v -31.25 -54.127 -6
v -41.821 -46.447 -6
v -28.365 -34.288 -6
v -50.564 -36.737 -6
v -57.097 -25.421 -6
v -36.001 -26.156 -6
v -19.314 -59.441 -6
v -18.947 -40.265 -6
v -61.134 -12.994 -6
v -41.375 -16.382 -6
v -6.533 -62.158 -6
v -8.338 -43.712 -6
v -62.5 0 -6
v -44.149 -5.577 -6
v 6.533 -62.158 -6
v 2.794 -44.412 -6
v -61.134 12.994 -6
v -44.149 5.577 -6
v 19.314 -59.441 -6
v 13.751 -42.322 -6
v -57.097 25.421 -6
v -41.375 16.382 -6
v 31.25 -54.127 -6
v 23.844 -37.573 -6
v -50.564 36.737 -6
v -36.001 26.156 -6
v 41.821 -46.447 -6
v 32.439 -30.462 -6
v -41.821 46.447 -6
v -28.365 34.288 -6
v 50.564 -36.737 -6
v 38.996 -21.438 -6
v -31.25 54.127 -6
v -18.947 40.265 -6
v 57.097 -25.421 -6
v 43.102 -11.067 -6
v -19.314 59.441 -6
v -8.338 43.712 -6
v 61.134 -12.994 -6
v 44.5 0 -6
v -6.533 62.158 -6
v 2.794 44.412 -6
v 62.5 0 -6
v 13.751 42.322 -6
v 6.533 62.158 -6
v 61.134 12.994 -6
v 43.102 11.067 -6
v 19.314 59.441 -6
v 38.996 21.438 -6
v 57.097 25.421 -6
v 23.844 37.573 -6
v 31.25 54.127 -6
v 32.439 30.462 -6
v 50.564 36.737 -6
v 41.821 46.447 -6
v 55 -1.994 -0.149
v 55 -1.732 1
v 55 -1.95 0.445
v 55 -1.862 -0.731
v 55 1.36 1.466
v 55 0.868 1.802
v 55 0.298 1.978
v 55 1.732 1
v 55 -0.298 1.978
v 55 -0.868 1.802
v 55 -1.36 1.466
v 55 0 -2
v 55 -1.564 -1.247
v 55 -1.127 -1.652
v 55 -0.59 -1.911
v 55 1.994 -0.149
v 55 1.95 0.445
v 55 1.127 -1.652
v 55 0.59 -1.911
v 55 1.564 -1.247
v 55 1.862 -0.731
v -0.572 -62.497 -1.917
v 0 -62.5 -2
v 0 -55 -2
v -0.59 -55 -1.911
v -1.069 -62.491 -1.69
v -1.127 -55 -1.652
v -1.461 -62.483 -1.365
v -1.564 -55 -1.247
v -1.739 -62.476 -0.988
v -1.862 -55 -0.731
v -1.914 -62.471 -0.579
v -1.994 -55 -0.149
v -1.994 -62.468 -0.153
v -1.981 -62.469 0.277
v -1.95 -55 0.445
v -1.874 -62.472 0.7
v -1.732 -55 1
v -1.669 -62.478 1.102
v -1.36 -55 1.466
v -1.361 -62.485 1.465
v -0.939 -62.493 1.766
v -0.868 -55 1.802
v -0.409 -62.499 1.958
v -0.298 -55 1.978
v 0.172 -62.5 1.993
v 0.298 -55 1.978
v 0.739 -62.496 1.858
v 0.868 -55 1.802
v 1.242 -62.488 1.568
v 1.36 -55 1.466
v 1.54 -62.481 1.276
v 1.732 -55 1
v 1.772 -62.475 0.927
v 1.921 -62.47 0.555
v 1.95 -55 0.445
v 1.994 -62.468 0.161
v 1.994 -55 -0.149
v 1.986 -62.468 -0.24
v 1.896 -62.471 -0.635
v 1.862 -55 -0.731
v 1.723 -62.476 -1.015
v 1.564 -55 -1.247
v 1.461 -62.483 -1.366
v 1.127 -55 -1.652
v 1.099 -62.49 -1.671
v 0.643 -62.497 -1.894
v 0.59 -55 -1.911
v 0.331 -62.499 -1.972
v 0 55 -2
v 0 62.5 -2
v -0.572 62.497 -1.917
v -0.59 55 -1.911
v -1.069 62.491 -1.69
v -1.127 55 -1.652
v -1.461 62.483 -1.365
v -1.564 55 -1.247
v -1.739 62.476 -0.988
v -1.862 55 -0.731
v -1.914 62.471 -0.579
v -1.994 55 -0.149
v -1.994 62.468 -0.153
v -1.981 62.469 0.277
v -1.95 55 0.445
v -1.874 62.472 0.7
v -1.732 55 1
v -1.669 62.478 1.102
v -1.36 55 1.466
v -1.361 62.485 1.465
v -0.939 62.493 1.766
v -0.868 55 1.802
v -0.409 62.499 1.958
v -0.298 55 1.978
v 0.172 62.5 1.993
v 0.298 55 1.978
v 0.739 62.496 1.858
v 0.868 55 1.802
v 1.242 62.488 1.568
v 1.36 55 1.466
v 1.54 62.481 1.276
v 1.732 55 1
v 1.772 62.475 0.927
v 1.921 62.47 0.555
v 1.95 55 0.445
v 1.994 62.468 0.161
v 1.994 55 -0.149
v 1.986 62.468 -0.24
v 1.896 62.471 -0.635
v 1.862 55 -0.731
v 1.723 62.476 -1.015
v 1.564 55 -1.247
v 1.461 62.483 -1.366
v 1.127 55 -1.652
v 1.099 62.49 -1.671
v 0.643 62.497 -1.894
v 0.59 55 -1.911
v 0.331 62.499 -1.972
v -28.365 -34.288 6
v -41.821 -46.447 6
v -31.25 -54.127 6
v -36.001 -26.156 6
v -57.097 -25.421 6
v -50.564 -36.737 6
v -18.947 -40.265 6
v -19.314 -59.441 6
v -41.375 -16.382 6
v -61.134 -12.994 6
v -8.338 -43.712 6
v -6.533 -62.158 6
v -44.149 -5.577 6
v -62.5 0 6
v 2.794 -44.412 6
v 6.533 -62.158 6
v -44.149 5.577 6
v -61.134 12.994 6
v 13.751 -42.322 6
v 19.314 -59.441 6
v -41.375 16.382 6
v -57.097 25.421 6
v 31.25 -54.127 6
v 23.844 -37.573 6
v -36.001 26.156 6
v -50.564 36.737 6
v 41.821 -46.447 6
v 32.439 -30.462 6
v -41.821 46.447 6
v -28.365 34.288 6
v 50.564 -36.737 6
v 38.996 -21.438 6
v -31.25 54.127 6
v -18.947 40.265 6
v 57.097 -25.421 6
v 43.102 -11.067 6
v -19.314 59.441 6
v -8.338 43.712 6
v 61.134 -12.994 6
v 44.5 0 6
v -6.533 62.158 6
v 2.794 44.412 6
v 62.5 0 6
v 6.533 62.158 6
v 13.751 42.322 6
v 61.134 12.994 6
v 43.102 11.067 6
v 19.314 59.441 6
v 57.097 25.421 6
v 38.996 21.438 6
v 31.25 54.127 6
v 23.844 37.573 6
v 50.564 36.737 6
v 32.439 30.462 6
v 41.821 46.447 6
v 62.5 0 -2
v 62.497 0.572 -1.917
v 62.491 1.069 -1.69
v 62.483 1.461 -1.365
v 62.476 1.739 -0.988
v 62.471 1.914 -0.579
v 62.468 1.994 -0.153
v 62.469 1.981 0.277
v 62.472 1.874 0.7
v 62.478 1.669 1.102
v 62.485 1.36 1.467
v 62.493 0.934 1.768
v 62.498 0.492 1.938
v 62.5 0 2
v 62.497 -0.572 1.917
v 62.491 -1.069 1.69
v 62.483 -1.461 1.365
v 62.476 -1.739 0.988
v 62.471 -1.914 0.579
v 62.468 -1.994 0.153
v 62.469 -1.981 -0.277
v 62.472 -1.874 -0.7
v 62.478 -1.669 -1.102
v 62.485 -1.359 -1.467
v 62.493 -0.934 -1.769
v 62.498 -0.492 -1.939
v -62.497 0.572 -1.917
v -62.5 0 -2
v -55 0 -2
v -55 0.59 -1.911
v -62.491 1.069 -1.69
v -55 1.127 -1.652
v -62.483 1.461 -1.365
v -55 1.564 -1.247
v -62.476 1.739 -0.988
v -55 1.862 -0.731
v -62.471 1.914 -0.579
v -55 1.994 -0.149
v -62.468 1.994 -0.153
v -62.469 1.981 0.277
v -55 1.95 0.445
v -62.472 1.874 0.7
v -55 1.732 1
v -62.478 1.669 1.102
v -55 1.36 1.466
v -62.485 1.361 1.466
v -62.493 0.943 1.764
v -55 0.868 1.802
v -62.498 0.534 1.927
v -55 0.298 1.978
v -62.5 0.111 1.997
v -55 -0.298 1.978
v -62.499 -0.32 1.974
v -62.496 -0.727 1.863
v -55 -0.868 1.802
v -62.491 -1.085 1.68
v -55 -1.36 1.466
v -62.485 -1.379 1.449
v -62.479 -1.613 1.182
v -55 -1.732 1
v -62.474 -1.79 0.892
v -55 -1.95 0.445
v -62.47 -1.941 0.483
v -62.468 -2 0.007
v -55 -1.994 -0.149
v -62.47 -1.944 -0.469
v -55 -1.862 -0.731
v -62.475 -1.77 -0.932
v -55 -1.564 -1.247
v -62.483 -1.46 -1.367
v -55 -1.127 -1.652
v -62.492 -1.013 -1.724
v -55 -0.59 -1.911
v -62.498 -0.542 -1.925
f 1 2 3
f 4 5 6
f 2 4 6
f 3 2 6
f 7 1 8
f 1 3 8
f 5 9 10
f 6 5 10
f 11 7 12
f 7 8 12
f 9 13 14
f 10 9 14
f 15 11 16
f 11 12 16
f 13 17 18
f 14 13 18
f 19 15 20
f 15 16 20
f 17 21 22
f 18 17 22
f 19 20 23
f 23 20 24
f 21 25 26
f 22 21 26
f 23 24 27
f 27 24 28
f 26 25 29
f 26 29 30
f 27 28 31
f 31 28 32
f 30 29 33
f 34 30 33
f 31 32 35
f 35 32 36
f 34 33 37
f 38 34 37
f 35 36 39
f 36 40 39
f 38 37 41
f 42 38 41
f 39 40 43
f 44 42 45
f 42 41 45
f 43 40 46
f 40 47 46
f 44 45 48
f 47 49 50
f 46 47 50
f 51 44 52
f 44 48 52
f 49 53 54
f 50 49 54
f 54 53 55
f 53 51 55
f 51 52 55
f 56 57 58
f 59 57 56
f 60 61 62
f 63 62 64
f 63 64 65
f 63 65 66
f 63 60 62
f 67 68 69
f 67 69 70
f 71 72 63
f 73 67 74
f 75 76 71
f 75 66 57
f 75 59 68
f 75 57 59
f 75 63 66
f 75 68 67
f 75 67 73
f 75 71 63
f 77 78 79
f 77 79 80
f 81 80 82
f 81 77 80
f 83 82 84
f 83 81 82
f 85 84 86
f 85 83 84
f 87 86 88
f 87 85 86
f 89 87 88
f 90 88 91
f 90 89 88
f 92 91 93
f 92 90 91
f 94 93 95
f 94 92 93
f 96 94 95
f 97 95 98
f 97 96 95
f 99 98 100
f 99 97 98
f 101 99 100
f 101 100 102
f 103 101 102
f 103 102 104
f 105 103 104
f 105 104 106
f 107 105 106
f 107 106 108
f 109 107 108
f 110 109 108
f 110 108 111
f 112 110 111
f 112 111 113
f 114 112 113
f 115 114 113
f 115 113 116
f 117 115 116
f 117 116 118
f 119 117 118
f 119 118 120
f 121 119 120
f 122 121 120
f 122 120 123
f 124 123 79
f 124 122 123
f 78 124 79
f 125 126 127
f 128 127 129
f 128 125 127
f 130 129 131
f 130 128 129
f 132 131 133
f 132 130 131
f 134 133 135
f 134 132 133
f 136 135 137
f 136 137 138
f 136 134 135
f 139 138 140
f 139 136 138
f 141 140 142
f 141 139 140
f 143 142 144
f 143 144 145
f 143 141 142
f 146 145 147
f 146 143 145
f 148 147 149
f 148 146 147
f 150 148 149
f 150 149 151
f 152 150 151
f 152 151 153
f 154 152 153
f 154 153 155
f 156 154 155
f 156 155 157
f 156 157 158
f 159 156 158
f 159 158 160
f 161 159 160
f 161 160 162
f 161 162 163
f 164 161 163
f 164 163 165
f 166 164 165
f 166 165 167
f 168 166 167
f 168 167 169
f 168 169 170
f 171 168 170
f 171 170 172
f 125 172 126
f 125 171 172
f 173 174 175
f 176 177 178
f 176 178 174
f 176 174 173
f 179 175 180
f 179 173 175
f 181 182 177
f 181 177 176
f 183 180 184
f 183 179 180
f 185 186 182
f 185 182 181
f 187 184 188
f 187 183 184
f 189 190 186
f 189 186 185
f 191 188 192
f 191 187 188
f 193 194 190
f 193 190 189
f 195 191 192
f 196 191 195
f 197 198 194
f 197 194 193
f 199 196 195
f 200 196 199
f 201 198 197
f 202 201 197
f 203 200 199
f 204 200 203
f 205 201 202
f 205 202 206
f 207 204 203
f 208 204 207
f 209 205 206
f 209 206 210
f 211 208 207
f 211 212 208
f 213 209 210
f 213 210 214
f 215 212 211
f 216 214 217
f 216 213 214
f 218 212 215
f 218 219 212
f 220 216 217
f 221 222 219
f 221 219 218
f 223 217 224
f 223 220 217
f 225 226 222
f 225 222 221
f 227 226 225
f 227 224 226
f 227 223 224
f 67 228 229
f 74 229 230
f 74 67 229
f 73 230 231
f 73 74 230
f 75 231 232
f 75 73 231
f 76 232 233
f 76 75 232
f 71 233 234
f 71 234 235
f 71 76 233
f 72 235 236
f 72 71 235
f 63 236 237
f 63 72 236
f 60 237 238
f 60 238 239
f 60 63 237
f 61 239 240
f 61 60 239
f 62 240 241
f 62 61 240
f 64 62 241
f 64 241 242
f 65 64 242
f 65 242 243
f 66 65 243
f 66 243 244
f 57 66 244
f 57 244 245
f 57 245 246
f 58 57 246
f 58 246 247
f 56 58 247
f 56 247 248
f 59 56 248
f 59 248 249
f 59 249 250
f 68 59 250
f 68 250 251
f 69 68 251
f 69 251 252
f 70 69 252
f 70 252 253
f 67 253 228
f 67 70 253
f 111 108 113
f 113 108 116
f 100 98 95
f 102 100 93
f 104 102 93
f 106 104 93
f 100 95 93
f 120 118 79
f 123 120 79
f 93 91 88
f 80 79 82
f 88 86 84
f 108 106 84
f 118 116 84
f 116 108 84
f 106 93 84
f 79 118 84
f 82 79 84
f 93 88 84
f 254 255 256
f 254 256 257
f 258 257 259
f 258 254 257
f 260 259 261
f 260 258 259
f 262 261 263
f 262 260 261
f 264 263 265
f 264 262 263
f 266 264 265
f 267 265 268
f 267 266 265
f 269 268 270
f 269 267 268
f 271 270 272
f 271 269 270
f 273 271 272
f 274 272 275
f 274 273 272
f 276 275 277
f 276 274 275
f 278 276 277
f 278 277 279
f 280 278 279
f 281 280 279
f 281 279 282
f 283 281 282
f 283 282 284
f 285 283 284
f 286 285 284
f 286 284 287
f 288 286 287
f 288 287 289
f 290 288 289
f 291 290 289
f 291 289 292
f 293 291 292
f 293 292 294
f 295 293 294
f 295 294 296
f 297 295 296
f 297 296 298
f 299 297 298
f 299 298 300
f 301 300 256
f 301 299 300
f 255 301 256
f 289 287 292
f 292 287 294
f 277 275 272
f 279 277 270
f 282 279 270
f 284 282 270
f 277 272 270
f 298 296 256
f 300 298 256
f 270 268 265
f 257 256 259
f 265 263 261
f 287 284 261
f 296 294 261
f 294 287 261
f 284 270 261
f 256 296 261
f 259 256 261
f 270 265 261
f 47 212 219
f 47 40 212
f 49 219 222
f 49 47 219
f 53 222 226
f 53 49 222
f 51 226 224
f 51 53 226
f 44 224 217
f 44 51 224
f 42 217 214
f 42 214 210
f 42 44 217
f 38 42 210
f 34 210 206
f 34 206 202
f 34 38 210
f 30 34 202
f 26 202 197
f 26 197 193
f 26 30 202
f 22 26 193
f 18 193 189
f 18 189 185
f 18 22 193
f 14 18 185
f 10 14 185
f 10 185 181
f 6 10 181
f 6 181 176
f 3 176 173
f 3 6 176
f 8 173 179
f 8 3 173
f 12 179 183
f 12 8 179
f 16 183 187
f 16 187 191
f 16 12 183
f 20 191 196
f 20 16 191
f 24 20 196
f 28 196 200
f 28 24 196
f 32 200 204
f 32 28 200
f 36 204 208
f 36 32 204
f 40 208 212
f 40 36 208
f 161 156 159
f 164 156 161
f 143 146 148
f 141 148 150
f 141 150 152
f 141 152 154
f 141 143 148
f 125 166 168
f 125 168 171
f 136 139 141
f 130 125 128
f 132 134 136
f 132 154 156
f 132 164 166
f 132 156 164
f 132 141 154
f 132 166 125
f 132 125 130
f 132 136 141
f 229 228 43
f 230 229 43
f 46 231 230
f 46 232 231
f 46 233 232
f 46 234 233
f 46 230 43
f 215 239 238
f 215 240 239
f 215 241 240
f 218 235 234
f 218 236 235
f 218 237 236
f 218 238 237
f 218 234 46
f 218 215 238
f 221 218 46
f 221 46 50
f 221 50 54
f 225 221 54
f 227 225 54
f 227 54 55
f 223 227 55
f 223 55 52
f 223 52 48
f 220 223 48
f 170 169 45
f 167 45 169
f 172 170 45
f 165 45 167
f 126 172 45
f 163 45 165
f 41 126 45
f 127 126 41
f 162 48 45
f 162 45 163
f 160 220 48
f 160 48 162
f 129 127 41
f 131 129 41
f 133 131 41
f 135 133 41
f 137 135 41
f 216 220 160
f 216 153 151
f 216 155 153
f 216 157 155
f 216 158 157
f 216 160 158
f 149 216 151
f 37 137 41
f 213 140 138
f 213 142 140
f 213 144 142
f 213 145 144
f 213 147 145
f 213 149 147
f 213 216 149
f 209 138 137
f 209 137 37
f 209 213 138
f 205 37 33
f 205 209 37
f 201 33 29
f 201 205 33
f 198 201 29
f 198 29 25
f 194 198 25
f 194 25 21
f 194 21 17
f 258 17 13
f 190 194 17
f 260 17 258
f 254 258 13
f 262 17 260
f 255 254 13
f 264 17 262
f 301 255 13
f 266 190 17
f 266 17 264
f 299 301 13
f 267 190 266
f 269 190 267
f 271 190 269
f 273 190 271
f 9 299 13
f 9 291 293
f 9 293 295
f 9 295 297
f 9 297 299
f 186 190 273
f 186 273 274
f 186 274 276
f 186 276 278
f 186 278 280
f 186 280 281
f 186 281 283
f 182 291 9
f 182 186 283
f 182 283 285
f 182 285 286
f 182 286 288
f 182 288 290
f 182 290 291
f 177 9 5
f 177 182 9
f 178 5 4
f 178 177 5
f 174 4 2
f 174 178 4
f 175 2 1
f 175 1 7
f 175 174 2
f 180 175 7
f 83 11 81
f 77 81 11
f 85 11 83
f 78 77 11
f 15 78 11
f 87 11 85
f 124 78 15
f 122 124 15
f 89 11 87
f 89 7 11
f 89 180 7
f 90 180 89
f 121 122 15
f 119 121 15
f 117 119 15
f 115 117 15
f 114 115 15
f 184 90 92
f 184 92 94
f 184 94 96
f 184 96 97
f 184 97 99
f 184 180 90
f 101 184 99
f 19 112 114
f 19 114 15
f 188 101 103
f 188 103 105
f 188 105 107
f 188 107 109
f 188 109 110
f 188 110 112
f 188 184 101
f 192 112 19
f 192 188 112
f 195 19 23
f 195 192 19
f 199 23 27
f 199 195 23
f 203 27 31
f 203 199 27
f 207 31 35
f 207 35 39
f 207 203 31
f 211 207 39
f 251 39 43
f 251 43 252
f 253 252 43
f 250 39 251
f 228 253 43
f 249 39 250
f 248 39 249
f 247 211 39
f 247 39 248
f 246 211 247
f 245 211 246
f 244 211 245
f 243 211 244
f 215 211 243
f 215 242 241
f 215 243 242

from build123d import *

# Parameters (mm, degrees)
SKETCH1_R           = 62.5
SKETCH1_R_2         = 44.5
BOSS_EXTRUDE1_DEPTH = 6
CUT_EXTRUDE1_START  = 55
SKETCH2_R           = 2
CUT_EXTRUDE1_DEPTH  = 10
CUT_EXTRUDE2_START  = -65
SKETCH2_2_R         = 2
CUT_EXTRUDE2_DEPTH  = 10
CUT_EXTRUDE3_START  = 55
SKETCH3_R           = 2
CUT_EXTRUDE3_DEPTH  = 10
CUT_EXTRUDE4_START  = -65
SKETCH3_2_R         = 2
CUT_EXTRUDE4_DEPTH  = 10


with BuildPart() as part:
    # Sketch1 → Boss-Extrude1 (new, symmetric)
    with BuildSketch(Plane.XY):
        Circle(SKETCH1_R)
        Circle(SKETCH1_R_2, mode=Mode.SUBTRACT)
    extrude(amount=BOSS_EXTRUDE1_DEPTH, both=True)

    # Sketch2 → Cut-Extrude1 (cut)
    with BuildSketch(Plane(origin=(0, 0, 0), x_dir=(1, 0, 0), z_dir=(0, 1, 0)).offset(CUT_EXTRUDE1_START)):
        Circle(SKETCH2_R)
    extrude(amount=CUT_EXTRUDE1_DEPTH, mode=Mode.SUBTRACT)

    # Sketch2<2> → Cut-Extrude2 (cut)
    with BuildSketch(Plane(origin=(0, 0, 0), x_dir=(1, 0, 0), z_dir=(0, 1, 0)).offset(CUT_EXTRUDE2_START)):
        Circle(SKETCH2_2_R)
    extrude(amount=CUT_EXTRUDE2_DEPTH, mode=Mode.SUBTRACT)

    # Sketch3 → Cut-Extrude3 (cut)
    with BuildSketch(Plane(origin=(0, 0, 0), x_dir=(0, 0, -1), z_dir=(1, 0, 0)).offset(CUT_EXTRUDE3_START)):
        Circle(SKETCH3_R)
    extrude(amount=CUT_EXTRUDE3_DEPTH, mode=Mode.SUBTRACT)

    # Sketch3<2> → Cut-Extrude4 (cut)
    with BuildSketch(Plane(origin=(0, 0, 0), x_dir=(0, 0, -1), z_dir=(1, 0, 0)).offset(CUT_EXTRUDE4_START)):
        Circle(SKETCH3_2_R)
    extrude(amount=CUT_EXTRUDE4_DEPTH, mode=Mode.SUBTRACT)


solid = part.part
